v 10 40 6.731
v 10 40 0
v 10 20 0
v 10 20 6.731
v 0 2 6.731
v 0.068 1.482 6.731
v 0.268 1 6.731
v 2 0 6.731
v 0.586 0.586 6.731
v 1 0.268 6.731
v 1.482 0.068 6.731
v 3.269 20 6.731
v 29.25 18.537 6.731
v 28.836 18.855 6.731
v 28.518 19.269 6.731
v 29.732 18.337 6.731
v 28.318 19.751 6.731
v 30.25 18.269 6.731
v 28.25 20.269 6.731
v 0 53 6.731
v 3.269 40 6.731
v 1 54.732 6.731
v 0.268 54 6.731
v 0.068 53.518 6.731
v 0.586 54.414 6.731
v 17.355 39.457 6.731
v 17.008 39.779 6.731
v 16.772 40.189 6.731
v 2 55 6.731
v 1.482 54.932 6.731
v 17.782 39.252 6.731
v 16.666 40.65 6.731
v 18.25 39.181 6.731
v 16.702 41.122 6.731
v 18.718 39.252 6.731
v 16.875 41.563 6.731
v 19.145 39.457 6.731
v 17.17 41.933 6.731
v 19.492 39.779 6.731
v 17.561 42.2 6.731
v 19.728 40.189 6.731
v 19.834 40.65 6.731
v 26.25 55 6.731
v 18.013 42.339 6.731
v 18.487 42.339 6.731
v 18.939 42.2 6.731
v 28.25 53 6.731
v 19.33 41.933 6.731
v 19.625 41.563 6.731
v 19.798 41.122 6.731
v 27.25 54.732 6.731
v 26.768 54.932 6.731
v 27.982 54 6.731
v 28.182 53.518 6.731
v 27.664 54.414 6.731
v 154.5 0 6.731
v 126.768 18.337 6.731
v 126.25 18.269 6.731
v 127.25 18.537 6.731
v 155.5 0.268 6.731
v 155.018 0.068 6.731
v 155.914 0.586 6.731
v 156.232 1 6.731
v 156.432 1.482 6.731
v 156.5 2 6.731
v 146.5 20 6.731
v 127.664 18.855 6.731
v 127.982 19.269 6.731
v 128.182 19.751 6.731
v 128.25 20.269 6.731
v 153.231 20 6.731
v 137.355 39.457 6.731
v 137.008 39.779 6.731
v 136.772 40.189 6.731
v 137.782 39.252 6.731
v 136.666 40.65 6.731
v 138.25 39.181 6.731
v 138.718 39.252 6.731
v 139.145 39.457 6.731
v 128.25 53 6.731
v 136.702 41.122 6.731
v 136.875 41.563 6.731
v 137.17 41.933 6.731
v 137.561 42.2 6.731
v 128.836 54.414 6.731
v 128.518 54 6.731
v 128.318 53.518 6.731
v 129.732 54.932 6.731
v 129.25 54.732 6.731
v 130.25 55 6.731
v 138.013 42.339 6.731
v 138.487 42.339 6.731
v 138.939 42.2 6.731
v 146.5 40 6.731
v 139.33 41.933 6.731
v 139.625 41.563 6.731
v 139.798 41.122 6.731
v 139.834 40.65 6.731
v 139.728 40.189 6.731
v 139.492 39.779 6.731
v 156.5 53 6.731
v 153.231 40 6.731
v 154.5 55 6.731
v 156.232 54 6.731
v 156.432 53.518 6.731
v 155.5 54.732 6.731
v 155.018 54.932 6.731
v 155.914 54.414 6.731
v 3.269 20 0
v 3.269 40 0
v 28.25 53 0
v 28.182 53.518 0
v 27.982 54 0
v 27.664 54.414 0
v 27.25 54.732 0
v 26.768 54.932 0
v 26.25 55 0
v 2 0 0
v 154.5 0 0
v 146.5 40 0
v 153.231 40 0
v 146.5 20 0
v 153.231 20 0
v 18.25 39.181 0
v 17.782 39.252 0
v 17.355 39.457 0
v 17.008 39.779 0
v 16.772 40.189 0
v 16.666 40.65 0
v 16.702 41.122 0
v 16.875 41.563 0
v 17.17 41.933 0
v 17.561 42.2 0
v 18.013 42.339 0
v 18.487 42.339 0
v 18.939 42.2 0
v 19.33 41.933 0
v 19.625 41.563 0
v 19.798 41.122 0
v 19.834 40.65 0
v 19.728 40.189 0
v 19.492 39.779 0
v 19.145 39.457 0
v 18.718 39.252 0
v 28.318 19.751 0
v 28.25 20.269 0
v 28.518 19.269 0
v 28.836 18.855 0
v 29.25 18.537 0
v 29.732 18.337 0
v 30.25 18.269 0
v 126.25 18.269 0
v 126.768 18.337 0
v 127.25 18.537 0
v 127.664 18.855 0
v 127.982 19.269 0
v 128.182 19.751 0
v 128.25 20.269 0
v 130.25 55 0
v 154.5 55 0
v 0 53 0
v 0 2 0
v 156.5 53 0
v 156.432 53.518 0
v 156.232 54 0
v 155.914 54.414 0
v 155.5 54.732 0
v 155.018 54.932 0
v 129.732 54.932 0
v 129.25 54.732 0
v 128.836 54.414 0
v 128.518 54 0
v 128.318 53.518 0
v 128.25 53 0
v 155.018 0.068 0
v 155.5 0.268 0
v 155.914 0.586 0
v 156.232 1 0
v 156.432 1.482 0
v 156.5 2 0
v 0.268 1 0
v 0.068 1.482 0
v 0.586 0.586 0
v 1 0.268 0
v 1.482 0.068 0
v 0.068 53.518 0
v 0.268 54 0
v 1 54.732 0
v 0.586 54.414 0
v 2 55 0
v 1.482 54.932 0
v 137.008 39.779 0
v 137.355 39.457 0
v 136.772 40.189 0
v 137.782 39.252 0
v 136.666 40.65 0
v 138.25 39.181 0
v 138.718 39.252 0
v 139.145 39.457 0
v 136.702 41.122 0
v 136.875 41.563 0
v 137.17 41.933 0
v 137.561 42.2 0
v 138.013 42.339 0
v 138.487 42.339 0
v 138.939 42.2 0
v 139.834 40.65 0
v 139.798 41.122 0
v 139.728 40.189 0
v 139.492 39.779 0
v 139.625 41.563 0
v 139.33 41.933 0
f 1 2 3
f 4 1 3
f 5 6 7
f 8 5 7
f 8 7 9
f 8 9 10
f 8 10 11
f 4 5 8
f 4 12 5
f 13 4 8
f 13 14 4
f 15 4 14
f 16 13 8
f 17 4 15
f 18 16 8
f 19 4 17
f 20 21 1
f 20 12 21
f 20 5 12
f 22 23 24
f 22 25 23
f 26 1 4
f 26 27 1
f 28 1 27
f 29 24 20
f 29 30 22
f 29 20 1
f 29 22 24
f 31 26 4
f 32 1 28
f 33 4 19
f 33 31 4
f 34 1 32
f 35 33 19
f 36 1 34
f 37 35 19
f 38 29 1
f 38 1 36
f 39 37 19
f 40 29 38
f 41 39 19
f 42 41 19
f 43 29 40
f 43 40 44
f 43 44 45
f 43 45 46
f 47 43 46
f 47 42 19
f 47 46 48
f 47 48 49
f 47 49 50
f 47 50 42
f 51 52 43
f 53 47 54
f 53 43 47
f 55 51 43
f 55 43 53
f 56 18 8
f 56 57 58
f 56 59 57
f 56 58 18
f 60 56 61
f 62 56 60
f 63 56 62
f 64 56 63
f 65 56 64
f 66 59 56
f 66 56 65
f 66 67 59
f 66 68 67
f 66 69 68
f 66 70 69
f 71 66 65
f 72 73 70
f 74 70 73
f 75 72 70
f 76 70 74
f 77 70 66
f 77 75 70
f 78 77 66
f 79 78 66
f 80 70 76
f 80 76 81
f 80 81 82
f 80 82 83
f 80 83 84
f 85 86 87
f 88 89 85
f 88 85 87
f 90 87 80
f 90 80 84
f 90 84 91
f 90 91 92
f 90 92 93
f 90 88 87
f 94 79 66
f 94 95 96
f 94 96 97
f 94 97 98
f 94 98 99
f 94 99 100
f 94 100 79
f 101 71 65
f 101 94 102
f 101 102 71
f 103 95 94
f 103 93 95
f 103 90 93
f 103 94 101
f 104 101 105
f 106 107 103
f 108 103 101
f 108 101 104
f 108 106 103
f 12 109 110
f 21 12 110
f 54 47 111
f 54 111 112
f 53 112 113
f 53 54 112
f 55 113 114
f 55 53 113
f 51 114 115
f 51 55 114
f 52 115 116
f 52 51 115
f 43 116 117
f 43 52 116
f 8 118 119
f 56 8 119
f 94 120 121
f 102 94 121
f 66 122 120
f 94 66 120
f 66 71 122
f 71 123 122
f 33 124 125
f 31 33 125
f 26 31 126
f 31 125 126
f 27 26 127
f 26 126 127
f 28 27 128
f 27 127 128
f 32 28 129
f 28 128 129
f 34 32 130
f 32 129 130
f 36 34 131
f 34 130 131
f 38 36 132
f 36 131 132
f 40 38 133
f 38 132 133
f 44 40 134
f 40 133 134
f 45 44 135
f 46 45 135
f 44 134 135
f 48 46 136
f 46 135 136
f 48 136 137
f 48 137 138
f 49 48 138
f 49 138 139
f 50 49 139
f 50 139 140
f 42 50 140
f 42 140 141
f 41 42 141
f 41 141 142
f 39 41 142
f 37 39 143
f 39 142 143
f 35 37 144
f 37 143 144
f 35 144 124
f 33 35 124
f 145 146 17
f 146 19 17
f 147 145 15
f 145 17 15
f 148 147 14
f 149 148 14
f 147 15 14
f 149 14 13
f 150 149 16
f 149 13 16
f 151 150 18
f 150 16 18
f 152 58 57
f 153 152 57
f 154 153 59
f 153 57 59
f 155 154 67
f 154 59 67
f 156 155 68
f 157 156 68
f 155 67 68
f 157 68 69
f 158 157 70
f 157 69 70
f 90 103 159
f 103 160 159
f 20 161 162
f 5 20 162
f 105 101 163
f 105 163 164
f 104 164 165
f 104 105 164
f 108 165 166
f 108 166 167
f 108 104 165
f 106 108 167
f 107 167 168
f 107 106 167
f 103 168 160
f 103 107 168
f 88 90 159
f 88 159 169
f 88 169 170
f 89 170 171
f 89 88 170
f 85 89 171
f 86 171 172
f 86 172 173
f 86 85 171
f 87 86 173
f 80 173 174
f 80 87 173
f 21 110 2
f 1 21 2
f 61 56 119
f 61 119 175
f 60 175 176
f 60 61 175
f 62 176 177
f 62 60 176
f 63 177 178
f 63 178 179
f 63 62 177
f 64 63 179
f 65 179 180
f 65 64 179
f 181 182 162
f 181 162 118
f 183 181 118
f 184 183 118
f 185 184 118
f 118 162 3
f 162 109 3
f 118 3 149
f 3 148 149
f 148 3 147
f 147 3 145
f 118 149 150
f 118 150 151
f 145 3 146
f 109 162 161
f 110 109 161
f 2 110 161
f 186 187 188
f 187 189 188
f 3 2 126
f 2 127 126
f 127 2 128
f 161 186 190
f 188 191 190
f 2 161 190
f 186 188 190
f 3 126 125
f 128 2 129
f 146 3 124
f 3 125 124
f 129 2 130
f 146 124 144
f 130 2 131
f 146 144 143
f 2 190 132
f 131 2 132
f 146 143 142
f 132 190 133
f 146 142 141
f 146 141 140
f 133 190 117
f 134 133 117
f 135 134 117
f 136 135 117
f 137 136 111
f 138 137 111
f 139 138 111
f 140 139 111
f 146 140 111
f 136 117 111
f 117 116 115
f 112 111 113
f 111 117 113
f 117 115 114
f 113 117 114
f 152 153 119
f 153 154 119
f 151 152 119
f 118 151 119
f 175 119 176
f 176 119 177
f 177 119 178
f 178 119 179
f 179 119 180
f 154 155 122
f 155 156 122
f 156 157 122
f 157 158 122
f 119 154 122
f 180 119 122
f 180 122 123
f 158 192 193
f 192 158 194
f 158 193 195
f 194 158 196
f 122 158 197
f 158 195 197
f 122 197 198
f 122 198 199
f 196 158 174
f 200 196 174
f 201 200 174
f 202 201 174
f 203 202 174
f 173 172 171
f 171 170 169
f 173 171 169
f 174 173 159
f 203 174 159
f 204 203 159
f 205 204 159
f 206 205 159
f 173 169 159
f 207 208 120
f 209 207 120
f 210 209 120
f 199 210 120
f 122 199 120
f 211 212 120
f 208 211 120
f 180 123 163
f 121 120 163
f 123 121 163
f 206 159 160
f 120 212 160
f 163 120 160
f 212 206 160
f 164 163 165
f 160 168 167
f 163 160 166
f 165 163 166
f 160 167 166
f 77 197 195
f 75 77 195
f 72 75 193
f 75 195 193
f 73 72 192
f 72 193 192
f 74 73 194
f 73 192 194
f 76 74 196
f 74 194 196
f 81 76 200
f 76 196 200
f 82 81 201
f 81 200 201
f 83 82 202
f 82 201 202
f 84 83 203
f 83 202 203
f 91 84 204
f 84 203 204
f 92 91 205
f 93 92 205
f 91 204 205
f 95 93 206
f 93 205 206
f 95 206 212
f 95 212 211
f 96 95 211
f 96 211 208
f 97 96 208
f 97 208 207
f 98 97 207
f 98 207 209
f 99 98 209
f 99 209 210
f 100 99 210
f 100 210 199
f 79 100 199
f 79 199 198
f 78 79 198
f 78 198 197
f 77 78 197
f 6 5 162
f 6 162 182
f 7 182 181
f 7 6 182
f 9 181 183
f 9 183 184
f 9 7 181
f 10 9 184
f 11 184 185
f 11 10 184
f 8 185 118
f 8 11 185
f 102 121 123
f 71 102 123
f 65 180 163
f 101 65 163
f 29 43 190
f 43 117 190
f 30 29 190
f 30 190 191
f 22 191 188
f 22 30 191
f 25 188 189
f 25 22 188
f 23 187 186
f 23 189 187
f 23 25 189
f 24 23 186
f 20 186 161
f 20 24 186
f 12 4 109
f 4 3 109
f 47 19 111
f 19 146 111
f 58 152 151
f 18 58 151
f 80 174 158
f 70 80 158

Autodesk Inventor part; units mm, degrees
ref_plane "YZ Plane" through (0, 0, 0) normal (1, 0, 0) x (0, 1, 0)
ref_plane "XZ Plane" through (0, 0, 0) normal (0, 1, 0) x (-1, 0, 0)
ref_plane "XY Plane" through (0, 0, 0) normal (0, 0, 1) x (1, 0, 0)
sketch "Sketch1" plane through (0, 0, 0) normal (0, 0, 1) x (1, 0, 0)
  line L0 (0, 0) -> (156.5, 0)
  line L1 (156.5, 0) -> (156.5, 55)
  line L2 (156.5, 55) -> (0, 55)
  line L3 (0, 55) -> (0, 0)
  line L4 (3.269, 40) -> (10, 40)
  line L5 (10, 40) -> (10, 20)
  line L6 (10, 20) -> (3.269, 20)
  line L7 (3.269, 20) -> (3.269, 40)
  line L8 (146.5, 40) -> (153.231, 40)
  line L9 (153.231, 40) -> (153.231, 20)
  line L10 (153.231, 20) -> (146.5, 20)
  line L11 (146.5, 20) -> (146.5, 40)
  line L12 (68.25, 10) -> (88.25, 10)
  line L13 (88.25, 10) -> (88.25, 3.269)
  line L14 (88.25, 3.269) -> (68.25, 3.269)
  line L15 (68.25, 3.269) -> (68.25, 10)
  line L16 (28.25, 55) -> (128.25, 55)
  line L17 (128.25, 55) -> (128.25, 18.269)
  line L18 (128.25, 18.269) -> (28.25, 18.269)
  line L19 (28.25, 18.269) -> (28.25, 55)
  point P0 (3.269, 30)
  point P1 (153.231, 30)
  point P2 (78.25, 18.269)
  point P3 (78.25, 55)
  dimension "d0" = 55
  dimension "d1" = 156.5
  dimension "d2" = 136.5
  dimension "d3" = 6.731
  dimension "d4" = 58.25
  dimension "d5" = 58.25
  dimension "d6" = 20
  dimension "d7" = 3.269
  dimension "d8" = 3.269
  dimension "d25" = 10
  dimension "d26" = 10
  dimension "d28" = 36.731
  dimension "d29" = 100
extrude "Extrusion1" add sketch "Sketch1" along normal blind 6.731 contours L3 L2 L19 L18 L17 L1 L0 | L12 L13 L14 L15
sketch "Sketch2" plane through (0, 0, 6.731) normal (0, 0, 1) x (1, 0, 0)
  line L0 (10, 40) -> (10, 20) projected
  line L1 (156.5, 55) -> (0, 55) projected
  line L2 (146.5, 20) -> (146.5, 40) projected
  point P0 (18.25, 40.769)
  point P1 (138.25, 40.769)
  dimension "d14" = 120
  dimension "d15" = 14.231
  dimension "d16" = -8.25
  dimension "d30" = -8.25
hole "Hole1" at (18.25, 40.769, 6.731) at (138.25, 40.769, 6.731) direction (0, 0, -1) diameter 3.176 end through all
fillet "Fillet1" radius 2 8 edges at (156.5, 55, 3.3655) (0, 55, 3.3655) (0, 0, 3.3655) (156.5, 0, 3.3655) (28.25, 18.269, 3.3655) (28.25, 55, 3.3655) (128.25, 55, 3.3655) (128.25, 18.269, 3.3655)
equation "\"d3\" = THICKB"
equation "\"d4\" = d5"
equation "\"d7\" = d8"
equation "\"d12\" = THICKB"
equation "\"d16\" = d30"
equation "\"THICKA\" = 3.175"
equation "\"THICKB\" = 6.731"
equation "\"THICKC\" = 12.7"
equation "\"THICKPLY\" = 5"
equation "\"MAGDIA\" = 9.5"
equation "\"BALLDIA\" = 12"
properties part number "Mount_LCD_Back"
